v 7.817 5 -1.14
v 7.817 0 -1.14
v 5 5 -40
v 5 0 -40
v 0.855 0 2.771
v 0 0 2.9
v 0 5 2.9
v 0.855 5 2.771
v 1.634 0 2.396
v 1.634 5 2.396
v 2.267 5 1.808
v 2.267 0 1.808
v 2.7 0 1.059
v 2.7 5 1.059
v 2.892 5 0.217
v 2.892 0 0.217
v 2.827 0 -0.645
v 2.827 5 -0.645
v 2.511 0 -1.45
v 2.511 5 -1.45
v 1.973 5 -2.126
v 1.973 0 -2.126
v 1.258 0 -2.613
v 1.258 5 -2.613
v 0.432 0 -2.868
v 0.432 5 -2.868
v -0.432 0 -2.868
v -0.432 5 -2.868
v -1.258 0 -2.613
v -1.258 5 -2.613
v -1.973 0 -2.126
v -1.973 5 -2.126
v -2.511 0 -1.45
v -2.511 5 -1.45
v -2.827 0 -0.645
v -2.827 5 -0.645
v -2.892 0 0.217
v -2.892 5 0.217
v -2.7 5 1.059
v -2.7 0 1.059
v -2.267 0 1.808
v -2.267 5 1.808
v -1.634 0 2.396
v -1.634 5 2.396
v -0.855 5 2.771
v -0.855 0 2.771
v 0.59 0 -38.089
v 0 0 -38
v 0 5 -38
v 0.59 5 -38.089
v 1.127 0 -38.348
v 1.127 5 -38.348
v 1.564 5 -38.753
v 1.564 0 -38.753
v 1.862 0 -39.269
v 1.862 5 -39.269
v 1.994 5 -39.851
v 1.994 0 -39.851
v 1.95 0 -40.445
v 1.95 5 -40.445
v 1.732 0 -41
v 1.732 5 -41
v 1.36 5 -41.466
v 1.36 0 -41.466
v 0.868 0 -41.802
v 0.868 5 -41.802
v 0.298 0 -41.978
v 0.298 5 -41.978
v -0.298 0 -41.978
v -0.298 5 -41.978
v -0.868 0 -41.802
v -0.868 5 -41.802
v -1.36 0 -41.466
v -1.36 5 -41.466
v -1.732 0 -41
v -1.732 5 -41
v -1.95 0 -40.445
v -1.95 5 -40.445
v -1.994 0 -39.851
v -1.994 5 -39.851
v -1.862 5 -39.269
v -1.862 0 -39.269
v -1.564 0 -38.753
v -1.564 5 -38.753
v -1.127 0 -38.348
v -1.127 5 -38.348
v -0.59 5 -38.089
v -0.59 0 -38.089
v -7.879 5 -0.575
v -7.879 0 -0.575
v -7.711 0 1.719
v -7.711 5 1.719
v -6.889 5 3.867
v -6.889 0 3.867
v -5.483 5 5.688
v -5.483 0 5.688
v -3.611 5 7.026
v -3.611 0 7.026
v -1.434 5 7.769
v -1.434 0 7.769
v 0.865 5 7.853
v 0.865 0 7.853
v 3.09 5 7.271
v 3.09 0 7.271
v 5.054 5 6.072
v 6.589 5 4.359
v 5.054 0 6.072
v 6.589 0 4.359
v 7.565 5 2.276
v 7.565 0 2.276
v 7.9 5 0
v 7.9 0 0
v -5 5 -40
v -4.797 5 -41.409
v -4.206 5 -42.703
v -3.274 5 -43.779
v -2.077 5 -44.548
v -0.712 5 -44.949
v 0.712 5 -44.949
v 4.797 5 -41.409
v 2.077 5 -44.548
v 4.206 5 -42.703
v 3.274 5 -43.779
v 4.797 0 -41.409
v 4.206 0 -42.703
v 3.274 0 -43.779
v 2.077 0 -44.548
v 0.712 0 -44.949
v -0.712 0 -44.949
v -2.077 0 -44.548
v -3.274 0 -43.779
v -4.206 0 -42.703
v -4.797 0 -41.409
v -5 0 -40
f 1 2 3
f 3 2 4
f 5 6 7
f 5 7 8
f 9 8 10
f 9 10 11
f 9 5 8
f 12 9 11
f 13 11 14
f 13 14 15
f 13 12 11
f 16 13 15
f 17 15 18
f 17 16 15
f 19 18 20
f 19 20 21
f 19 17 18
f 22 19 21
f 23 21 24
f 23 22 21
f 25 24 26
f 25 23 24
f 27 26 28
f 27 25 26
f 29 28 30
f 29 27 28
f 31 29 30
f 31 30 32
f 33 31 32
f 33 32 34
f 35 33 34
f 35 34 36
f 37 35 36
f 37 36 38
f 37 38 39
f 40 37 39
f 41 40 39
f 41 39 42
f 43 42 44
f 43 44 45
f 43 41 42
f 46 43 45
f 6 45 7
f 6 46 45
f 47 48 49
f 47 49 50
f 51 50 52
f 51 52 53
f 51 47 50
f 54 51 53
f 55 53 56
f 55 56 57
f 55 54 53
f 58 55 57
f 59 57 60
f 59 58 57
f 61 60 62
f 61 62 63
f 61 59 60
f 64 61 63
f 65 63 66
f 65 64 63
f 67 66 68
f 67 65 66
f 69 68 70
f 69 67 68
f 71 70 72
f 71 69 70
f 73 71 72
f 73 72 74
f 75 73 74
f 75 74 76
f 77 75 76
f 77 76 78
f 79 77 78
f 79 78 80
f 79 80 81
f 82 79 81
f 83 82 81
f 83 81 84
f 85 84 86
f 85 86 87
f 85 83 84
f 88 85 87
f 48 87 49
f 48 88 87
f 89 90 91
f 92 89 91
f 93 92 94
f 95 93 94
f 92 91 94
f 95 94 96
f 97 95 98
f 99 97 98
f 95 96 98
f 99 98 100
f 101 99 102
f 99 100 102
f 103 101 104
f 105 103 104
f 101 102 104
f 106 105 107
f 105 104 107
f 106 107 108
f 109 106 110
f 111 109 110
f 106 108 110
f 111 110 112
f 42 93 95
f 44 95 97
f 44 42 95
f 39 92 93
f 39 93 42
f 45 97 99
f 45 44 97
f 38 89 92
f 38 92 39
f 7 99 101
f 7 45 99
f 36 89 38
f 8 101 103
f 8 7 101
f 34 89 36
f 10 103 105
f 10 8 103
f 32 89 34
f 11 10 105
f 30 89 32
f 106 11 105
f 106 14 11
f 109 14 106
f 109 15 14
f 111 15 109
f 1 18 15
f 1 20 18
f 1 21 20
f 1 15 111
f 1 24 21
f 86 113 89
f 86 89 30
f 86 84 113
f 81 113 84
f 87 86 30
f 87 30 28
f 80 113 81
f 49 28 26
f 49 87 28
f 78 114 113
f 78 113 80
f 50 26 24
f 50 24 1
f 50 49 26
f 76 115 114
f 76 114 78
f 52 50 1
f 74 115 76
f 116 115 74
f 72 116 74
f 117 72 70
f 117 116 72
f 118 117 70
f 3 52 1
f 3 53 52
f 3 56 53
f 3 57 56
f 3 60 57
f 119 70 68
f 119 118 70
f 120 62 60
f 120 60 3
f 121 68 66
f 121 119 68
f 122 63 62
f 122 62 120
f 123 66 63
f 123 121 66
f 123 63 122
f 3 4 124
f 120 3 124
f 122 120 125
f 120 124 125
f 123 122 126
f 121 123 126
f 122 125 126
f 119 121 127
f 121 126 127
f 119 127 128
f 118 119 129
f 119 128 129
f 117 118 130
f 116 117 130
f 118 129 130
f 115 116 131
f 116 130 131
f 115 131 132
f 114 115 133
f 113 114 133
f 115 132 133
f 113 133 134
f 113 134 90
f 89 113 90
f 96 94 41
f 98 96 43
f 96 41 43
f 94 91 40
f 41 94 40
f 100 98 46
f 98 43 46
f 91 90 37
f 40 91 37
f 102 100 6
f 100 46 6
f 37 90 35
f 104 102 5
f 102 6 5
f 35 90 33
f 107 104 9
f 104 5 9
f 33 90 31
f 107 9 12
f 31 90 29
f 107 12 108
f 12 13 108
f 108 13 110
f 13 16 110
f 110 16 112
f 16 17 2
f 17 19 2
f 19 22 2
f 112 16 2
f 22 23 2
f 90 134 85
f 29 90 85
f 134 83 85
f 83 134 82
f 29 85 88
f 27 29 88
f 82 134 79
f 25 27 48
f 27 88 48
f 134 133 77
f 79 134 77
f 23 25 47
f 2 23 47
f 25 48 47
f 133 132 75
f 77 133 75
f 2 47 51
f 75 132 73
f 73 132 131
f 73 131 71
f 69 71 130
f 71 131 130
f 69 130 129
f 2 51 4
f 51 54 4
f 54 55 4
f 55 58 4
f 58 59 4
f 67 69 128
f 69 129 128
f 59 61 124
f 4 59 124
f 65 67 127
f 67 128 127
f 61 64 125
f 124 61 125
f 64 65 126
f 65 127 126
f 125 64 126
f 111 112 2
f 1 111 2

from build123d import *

# Parameters (mm, degrees)
SKETCH1_R           = 2.9
SKETCH1_R_2         = 2
BOSS_EXTRUDE1_DEPTH = 5


with BuildPart() as part:
    # Sketch1 → Boss-Extrude1 (new body)
    with BuildSketch(Plane(origin=(0, 0, 0), x_dir=(1, 0, 0), z_dir=(0, 1, 0))):
        with BuildLine():
            Line((-5, 40), (-7.87901938, 0.575372577))
            ThreePointArc((-7.87901938, 0.575372577), (-0.287877487, -7.894753103), (7.9, 0))
            Line((7.9, 0), (7.817385493, 1.139510448))
            Line((7.817385493, 1.139510448), (5, 40))
            ThreePointArc((5, 40), (0, 45), (-5, 40))
        make_face()
        with Locations(Location((0, 0, 0), (0, 0, 270))):
            Circle(SKETCH1_R, mode=Mode.SUBTRACT)
        with Locations(Location((0, 40, 0), (0, 0, 270))):
            Circle(SKETCH1_R_2, mode=Mode.SUBTRACT)
    extrude(amount=BOSS_EXTRUDE1_DEPTH)


solid = part.part
